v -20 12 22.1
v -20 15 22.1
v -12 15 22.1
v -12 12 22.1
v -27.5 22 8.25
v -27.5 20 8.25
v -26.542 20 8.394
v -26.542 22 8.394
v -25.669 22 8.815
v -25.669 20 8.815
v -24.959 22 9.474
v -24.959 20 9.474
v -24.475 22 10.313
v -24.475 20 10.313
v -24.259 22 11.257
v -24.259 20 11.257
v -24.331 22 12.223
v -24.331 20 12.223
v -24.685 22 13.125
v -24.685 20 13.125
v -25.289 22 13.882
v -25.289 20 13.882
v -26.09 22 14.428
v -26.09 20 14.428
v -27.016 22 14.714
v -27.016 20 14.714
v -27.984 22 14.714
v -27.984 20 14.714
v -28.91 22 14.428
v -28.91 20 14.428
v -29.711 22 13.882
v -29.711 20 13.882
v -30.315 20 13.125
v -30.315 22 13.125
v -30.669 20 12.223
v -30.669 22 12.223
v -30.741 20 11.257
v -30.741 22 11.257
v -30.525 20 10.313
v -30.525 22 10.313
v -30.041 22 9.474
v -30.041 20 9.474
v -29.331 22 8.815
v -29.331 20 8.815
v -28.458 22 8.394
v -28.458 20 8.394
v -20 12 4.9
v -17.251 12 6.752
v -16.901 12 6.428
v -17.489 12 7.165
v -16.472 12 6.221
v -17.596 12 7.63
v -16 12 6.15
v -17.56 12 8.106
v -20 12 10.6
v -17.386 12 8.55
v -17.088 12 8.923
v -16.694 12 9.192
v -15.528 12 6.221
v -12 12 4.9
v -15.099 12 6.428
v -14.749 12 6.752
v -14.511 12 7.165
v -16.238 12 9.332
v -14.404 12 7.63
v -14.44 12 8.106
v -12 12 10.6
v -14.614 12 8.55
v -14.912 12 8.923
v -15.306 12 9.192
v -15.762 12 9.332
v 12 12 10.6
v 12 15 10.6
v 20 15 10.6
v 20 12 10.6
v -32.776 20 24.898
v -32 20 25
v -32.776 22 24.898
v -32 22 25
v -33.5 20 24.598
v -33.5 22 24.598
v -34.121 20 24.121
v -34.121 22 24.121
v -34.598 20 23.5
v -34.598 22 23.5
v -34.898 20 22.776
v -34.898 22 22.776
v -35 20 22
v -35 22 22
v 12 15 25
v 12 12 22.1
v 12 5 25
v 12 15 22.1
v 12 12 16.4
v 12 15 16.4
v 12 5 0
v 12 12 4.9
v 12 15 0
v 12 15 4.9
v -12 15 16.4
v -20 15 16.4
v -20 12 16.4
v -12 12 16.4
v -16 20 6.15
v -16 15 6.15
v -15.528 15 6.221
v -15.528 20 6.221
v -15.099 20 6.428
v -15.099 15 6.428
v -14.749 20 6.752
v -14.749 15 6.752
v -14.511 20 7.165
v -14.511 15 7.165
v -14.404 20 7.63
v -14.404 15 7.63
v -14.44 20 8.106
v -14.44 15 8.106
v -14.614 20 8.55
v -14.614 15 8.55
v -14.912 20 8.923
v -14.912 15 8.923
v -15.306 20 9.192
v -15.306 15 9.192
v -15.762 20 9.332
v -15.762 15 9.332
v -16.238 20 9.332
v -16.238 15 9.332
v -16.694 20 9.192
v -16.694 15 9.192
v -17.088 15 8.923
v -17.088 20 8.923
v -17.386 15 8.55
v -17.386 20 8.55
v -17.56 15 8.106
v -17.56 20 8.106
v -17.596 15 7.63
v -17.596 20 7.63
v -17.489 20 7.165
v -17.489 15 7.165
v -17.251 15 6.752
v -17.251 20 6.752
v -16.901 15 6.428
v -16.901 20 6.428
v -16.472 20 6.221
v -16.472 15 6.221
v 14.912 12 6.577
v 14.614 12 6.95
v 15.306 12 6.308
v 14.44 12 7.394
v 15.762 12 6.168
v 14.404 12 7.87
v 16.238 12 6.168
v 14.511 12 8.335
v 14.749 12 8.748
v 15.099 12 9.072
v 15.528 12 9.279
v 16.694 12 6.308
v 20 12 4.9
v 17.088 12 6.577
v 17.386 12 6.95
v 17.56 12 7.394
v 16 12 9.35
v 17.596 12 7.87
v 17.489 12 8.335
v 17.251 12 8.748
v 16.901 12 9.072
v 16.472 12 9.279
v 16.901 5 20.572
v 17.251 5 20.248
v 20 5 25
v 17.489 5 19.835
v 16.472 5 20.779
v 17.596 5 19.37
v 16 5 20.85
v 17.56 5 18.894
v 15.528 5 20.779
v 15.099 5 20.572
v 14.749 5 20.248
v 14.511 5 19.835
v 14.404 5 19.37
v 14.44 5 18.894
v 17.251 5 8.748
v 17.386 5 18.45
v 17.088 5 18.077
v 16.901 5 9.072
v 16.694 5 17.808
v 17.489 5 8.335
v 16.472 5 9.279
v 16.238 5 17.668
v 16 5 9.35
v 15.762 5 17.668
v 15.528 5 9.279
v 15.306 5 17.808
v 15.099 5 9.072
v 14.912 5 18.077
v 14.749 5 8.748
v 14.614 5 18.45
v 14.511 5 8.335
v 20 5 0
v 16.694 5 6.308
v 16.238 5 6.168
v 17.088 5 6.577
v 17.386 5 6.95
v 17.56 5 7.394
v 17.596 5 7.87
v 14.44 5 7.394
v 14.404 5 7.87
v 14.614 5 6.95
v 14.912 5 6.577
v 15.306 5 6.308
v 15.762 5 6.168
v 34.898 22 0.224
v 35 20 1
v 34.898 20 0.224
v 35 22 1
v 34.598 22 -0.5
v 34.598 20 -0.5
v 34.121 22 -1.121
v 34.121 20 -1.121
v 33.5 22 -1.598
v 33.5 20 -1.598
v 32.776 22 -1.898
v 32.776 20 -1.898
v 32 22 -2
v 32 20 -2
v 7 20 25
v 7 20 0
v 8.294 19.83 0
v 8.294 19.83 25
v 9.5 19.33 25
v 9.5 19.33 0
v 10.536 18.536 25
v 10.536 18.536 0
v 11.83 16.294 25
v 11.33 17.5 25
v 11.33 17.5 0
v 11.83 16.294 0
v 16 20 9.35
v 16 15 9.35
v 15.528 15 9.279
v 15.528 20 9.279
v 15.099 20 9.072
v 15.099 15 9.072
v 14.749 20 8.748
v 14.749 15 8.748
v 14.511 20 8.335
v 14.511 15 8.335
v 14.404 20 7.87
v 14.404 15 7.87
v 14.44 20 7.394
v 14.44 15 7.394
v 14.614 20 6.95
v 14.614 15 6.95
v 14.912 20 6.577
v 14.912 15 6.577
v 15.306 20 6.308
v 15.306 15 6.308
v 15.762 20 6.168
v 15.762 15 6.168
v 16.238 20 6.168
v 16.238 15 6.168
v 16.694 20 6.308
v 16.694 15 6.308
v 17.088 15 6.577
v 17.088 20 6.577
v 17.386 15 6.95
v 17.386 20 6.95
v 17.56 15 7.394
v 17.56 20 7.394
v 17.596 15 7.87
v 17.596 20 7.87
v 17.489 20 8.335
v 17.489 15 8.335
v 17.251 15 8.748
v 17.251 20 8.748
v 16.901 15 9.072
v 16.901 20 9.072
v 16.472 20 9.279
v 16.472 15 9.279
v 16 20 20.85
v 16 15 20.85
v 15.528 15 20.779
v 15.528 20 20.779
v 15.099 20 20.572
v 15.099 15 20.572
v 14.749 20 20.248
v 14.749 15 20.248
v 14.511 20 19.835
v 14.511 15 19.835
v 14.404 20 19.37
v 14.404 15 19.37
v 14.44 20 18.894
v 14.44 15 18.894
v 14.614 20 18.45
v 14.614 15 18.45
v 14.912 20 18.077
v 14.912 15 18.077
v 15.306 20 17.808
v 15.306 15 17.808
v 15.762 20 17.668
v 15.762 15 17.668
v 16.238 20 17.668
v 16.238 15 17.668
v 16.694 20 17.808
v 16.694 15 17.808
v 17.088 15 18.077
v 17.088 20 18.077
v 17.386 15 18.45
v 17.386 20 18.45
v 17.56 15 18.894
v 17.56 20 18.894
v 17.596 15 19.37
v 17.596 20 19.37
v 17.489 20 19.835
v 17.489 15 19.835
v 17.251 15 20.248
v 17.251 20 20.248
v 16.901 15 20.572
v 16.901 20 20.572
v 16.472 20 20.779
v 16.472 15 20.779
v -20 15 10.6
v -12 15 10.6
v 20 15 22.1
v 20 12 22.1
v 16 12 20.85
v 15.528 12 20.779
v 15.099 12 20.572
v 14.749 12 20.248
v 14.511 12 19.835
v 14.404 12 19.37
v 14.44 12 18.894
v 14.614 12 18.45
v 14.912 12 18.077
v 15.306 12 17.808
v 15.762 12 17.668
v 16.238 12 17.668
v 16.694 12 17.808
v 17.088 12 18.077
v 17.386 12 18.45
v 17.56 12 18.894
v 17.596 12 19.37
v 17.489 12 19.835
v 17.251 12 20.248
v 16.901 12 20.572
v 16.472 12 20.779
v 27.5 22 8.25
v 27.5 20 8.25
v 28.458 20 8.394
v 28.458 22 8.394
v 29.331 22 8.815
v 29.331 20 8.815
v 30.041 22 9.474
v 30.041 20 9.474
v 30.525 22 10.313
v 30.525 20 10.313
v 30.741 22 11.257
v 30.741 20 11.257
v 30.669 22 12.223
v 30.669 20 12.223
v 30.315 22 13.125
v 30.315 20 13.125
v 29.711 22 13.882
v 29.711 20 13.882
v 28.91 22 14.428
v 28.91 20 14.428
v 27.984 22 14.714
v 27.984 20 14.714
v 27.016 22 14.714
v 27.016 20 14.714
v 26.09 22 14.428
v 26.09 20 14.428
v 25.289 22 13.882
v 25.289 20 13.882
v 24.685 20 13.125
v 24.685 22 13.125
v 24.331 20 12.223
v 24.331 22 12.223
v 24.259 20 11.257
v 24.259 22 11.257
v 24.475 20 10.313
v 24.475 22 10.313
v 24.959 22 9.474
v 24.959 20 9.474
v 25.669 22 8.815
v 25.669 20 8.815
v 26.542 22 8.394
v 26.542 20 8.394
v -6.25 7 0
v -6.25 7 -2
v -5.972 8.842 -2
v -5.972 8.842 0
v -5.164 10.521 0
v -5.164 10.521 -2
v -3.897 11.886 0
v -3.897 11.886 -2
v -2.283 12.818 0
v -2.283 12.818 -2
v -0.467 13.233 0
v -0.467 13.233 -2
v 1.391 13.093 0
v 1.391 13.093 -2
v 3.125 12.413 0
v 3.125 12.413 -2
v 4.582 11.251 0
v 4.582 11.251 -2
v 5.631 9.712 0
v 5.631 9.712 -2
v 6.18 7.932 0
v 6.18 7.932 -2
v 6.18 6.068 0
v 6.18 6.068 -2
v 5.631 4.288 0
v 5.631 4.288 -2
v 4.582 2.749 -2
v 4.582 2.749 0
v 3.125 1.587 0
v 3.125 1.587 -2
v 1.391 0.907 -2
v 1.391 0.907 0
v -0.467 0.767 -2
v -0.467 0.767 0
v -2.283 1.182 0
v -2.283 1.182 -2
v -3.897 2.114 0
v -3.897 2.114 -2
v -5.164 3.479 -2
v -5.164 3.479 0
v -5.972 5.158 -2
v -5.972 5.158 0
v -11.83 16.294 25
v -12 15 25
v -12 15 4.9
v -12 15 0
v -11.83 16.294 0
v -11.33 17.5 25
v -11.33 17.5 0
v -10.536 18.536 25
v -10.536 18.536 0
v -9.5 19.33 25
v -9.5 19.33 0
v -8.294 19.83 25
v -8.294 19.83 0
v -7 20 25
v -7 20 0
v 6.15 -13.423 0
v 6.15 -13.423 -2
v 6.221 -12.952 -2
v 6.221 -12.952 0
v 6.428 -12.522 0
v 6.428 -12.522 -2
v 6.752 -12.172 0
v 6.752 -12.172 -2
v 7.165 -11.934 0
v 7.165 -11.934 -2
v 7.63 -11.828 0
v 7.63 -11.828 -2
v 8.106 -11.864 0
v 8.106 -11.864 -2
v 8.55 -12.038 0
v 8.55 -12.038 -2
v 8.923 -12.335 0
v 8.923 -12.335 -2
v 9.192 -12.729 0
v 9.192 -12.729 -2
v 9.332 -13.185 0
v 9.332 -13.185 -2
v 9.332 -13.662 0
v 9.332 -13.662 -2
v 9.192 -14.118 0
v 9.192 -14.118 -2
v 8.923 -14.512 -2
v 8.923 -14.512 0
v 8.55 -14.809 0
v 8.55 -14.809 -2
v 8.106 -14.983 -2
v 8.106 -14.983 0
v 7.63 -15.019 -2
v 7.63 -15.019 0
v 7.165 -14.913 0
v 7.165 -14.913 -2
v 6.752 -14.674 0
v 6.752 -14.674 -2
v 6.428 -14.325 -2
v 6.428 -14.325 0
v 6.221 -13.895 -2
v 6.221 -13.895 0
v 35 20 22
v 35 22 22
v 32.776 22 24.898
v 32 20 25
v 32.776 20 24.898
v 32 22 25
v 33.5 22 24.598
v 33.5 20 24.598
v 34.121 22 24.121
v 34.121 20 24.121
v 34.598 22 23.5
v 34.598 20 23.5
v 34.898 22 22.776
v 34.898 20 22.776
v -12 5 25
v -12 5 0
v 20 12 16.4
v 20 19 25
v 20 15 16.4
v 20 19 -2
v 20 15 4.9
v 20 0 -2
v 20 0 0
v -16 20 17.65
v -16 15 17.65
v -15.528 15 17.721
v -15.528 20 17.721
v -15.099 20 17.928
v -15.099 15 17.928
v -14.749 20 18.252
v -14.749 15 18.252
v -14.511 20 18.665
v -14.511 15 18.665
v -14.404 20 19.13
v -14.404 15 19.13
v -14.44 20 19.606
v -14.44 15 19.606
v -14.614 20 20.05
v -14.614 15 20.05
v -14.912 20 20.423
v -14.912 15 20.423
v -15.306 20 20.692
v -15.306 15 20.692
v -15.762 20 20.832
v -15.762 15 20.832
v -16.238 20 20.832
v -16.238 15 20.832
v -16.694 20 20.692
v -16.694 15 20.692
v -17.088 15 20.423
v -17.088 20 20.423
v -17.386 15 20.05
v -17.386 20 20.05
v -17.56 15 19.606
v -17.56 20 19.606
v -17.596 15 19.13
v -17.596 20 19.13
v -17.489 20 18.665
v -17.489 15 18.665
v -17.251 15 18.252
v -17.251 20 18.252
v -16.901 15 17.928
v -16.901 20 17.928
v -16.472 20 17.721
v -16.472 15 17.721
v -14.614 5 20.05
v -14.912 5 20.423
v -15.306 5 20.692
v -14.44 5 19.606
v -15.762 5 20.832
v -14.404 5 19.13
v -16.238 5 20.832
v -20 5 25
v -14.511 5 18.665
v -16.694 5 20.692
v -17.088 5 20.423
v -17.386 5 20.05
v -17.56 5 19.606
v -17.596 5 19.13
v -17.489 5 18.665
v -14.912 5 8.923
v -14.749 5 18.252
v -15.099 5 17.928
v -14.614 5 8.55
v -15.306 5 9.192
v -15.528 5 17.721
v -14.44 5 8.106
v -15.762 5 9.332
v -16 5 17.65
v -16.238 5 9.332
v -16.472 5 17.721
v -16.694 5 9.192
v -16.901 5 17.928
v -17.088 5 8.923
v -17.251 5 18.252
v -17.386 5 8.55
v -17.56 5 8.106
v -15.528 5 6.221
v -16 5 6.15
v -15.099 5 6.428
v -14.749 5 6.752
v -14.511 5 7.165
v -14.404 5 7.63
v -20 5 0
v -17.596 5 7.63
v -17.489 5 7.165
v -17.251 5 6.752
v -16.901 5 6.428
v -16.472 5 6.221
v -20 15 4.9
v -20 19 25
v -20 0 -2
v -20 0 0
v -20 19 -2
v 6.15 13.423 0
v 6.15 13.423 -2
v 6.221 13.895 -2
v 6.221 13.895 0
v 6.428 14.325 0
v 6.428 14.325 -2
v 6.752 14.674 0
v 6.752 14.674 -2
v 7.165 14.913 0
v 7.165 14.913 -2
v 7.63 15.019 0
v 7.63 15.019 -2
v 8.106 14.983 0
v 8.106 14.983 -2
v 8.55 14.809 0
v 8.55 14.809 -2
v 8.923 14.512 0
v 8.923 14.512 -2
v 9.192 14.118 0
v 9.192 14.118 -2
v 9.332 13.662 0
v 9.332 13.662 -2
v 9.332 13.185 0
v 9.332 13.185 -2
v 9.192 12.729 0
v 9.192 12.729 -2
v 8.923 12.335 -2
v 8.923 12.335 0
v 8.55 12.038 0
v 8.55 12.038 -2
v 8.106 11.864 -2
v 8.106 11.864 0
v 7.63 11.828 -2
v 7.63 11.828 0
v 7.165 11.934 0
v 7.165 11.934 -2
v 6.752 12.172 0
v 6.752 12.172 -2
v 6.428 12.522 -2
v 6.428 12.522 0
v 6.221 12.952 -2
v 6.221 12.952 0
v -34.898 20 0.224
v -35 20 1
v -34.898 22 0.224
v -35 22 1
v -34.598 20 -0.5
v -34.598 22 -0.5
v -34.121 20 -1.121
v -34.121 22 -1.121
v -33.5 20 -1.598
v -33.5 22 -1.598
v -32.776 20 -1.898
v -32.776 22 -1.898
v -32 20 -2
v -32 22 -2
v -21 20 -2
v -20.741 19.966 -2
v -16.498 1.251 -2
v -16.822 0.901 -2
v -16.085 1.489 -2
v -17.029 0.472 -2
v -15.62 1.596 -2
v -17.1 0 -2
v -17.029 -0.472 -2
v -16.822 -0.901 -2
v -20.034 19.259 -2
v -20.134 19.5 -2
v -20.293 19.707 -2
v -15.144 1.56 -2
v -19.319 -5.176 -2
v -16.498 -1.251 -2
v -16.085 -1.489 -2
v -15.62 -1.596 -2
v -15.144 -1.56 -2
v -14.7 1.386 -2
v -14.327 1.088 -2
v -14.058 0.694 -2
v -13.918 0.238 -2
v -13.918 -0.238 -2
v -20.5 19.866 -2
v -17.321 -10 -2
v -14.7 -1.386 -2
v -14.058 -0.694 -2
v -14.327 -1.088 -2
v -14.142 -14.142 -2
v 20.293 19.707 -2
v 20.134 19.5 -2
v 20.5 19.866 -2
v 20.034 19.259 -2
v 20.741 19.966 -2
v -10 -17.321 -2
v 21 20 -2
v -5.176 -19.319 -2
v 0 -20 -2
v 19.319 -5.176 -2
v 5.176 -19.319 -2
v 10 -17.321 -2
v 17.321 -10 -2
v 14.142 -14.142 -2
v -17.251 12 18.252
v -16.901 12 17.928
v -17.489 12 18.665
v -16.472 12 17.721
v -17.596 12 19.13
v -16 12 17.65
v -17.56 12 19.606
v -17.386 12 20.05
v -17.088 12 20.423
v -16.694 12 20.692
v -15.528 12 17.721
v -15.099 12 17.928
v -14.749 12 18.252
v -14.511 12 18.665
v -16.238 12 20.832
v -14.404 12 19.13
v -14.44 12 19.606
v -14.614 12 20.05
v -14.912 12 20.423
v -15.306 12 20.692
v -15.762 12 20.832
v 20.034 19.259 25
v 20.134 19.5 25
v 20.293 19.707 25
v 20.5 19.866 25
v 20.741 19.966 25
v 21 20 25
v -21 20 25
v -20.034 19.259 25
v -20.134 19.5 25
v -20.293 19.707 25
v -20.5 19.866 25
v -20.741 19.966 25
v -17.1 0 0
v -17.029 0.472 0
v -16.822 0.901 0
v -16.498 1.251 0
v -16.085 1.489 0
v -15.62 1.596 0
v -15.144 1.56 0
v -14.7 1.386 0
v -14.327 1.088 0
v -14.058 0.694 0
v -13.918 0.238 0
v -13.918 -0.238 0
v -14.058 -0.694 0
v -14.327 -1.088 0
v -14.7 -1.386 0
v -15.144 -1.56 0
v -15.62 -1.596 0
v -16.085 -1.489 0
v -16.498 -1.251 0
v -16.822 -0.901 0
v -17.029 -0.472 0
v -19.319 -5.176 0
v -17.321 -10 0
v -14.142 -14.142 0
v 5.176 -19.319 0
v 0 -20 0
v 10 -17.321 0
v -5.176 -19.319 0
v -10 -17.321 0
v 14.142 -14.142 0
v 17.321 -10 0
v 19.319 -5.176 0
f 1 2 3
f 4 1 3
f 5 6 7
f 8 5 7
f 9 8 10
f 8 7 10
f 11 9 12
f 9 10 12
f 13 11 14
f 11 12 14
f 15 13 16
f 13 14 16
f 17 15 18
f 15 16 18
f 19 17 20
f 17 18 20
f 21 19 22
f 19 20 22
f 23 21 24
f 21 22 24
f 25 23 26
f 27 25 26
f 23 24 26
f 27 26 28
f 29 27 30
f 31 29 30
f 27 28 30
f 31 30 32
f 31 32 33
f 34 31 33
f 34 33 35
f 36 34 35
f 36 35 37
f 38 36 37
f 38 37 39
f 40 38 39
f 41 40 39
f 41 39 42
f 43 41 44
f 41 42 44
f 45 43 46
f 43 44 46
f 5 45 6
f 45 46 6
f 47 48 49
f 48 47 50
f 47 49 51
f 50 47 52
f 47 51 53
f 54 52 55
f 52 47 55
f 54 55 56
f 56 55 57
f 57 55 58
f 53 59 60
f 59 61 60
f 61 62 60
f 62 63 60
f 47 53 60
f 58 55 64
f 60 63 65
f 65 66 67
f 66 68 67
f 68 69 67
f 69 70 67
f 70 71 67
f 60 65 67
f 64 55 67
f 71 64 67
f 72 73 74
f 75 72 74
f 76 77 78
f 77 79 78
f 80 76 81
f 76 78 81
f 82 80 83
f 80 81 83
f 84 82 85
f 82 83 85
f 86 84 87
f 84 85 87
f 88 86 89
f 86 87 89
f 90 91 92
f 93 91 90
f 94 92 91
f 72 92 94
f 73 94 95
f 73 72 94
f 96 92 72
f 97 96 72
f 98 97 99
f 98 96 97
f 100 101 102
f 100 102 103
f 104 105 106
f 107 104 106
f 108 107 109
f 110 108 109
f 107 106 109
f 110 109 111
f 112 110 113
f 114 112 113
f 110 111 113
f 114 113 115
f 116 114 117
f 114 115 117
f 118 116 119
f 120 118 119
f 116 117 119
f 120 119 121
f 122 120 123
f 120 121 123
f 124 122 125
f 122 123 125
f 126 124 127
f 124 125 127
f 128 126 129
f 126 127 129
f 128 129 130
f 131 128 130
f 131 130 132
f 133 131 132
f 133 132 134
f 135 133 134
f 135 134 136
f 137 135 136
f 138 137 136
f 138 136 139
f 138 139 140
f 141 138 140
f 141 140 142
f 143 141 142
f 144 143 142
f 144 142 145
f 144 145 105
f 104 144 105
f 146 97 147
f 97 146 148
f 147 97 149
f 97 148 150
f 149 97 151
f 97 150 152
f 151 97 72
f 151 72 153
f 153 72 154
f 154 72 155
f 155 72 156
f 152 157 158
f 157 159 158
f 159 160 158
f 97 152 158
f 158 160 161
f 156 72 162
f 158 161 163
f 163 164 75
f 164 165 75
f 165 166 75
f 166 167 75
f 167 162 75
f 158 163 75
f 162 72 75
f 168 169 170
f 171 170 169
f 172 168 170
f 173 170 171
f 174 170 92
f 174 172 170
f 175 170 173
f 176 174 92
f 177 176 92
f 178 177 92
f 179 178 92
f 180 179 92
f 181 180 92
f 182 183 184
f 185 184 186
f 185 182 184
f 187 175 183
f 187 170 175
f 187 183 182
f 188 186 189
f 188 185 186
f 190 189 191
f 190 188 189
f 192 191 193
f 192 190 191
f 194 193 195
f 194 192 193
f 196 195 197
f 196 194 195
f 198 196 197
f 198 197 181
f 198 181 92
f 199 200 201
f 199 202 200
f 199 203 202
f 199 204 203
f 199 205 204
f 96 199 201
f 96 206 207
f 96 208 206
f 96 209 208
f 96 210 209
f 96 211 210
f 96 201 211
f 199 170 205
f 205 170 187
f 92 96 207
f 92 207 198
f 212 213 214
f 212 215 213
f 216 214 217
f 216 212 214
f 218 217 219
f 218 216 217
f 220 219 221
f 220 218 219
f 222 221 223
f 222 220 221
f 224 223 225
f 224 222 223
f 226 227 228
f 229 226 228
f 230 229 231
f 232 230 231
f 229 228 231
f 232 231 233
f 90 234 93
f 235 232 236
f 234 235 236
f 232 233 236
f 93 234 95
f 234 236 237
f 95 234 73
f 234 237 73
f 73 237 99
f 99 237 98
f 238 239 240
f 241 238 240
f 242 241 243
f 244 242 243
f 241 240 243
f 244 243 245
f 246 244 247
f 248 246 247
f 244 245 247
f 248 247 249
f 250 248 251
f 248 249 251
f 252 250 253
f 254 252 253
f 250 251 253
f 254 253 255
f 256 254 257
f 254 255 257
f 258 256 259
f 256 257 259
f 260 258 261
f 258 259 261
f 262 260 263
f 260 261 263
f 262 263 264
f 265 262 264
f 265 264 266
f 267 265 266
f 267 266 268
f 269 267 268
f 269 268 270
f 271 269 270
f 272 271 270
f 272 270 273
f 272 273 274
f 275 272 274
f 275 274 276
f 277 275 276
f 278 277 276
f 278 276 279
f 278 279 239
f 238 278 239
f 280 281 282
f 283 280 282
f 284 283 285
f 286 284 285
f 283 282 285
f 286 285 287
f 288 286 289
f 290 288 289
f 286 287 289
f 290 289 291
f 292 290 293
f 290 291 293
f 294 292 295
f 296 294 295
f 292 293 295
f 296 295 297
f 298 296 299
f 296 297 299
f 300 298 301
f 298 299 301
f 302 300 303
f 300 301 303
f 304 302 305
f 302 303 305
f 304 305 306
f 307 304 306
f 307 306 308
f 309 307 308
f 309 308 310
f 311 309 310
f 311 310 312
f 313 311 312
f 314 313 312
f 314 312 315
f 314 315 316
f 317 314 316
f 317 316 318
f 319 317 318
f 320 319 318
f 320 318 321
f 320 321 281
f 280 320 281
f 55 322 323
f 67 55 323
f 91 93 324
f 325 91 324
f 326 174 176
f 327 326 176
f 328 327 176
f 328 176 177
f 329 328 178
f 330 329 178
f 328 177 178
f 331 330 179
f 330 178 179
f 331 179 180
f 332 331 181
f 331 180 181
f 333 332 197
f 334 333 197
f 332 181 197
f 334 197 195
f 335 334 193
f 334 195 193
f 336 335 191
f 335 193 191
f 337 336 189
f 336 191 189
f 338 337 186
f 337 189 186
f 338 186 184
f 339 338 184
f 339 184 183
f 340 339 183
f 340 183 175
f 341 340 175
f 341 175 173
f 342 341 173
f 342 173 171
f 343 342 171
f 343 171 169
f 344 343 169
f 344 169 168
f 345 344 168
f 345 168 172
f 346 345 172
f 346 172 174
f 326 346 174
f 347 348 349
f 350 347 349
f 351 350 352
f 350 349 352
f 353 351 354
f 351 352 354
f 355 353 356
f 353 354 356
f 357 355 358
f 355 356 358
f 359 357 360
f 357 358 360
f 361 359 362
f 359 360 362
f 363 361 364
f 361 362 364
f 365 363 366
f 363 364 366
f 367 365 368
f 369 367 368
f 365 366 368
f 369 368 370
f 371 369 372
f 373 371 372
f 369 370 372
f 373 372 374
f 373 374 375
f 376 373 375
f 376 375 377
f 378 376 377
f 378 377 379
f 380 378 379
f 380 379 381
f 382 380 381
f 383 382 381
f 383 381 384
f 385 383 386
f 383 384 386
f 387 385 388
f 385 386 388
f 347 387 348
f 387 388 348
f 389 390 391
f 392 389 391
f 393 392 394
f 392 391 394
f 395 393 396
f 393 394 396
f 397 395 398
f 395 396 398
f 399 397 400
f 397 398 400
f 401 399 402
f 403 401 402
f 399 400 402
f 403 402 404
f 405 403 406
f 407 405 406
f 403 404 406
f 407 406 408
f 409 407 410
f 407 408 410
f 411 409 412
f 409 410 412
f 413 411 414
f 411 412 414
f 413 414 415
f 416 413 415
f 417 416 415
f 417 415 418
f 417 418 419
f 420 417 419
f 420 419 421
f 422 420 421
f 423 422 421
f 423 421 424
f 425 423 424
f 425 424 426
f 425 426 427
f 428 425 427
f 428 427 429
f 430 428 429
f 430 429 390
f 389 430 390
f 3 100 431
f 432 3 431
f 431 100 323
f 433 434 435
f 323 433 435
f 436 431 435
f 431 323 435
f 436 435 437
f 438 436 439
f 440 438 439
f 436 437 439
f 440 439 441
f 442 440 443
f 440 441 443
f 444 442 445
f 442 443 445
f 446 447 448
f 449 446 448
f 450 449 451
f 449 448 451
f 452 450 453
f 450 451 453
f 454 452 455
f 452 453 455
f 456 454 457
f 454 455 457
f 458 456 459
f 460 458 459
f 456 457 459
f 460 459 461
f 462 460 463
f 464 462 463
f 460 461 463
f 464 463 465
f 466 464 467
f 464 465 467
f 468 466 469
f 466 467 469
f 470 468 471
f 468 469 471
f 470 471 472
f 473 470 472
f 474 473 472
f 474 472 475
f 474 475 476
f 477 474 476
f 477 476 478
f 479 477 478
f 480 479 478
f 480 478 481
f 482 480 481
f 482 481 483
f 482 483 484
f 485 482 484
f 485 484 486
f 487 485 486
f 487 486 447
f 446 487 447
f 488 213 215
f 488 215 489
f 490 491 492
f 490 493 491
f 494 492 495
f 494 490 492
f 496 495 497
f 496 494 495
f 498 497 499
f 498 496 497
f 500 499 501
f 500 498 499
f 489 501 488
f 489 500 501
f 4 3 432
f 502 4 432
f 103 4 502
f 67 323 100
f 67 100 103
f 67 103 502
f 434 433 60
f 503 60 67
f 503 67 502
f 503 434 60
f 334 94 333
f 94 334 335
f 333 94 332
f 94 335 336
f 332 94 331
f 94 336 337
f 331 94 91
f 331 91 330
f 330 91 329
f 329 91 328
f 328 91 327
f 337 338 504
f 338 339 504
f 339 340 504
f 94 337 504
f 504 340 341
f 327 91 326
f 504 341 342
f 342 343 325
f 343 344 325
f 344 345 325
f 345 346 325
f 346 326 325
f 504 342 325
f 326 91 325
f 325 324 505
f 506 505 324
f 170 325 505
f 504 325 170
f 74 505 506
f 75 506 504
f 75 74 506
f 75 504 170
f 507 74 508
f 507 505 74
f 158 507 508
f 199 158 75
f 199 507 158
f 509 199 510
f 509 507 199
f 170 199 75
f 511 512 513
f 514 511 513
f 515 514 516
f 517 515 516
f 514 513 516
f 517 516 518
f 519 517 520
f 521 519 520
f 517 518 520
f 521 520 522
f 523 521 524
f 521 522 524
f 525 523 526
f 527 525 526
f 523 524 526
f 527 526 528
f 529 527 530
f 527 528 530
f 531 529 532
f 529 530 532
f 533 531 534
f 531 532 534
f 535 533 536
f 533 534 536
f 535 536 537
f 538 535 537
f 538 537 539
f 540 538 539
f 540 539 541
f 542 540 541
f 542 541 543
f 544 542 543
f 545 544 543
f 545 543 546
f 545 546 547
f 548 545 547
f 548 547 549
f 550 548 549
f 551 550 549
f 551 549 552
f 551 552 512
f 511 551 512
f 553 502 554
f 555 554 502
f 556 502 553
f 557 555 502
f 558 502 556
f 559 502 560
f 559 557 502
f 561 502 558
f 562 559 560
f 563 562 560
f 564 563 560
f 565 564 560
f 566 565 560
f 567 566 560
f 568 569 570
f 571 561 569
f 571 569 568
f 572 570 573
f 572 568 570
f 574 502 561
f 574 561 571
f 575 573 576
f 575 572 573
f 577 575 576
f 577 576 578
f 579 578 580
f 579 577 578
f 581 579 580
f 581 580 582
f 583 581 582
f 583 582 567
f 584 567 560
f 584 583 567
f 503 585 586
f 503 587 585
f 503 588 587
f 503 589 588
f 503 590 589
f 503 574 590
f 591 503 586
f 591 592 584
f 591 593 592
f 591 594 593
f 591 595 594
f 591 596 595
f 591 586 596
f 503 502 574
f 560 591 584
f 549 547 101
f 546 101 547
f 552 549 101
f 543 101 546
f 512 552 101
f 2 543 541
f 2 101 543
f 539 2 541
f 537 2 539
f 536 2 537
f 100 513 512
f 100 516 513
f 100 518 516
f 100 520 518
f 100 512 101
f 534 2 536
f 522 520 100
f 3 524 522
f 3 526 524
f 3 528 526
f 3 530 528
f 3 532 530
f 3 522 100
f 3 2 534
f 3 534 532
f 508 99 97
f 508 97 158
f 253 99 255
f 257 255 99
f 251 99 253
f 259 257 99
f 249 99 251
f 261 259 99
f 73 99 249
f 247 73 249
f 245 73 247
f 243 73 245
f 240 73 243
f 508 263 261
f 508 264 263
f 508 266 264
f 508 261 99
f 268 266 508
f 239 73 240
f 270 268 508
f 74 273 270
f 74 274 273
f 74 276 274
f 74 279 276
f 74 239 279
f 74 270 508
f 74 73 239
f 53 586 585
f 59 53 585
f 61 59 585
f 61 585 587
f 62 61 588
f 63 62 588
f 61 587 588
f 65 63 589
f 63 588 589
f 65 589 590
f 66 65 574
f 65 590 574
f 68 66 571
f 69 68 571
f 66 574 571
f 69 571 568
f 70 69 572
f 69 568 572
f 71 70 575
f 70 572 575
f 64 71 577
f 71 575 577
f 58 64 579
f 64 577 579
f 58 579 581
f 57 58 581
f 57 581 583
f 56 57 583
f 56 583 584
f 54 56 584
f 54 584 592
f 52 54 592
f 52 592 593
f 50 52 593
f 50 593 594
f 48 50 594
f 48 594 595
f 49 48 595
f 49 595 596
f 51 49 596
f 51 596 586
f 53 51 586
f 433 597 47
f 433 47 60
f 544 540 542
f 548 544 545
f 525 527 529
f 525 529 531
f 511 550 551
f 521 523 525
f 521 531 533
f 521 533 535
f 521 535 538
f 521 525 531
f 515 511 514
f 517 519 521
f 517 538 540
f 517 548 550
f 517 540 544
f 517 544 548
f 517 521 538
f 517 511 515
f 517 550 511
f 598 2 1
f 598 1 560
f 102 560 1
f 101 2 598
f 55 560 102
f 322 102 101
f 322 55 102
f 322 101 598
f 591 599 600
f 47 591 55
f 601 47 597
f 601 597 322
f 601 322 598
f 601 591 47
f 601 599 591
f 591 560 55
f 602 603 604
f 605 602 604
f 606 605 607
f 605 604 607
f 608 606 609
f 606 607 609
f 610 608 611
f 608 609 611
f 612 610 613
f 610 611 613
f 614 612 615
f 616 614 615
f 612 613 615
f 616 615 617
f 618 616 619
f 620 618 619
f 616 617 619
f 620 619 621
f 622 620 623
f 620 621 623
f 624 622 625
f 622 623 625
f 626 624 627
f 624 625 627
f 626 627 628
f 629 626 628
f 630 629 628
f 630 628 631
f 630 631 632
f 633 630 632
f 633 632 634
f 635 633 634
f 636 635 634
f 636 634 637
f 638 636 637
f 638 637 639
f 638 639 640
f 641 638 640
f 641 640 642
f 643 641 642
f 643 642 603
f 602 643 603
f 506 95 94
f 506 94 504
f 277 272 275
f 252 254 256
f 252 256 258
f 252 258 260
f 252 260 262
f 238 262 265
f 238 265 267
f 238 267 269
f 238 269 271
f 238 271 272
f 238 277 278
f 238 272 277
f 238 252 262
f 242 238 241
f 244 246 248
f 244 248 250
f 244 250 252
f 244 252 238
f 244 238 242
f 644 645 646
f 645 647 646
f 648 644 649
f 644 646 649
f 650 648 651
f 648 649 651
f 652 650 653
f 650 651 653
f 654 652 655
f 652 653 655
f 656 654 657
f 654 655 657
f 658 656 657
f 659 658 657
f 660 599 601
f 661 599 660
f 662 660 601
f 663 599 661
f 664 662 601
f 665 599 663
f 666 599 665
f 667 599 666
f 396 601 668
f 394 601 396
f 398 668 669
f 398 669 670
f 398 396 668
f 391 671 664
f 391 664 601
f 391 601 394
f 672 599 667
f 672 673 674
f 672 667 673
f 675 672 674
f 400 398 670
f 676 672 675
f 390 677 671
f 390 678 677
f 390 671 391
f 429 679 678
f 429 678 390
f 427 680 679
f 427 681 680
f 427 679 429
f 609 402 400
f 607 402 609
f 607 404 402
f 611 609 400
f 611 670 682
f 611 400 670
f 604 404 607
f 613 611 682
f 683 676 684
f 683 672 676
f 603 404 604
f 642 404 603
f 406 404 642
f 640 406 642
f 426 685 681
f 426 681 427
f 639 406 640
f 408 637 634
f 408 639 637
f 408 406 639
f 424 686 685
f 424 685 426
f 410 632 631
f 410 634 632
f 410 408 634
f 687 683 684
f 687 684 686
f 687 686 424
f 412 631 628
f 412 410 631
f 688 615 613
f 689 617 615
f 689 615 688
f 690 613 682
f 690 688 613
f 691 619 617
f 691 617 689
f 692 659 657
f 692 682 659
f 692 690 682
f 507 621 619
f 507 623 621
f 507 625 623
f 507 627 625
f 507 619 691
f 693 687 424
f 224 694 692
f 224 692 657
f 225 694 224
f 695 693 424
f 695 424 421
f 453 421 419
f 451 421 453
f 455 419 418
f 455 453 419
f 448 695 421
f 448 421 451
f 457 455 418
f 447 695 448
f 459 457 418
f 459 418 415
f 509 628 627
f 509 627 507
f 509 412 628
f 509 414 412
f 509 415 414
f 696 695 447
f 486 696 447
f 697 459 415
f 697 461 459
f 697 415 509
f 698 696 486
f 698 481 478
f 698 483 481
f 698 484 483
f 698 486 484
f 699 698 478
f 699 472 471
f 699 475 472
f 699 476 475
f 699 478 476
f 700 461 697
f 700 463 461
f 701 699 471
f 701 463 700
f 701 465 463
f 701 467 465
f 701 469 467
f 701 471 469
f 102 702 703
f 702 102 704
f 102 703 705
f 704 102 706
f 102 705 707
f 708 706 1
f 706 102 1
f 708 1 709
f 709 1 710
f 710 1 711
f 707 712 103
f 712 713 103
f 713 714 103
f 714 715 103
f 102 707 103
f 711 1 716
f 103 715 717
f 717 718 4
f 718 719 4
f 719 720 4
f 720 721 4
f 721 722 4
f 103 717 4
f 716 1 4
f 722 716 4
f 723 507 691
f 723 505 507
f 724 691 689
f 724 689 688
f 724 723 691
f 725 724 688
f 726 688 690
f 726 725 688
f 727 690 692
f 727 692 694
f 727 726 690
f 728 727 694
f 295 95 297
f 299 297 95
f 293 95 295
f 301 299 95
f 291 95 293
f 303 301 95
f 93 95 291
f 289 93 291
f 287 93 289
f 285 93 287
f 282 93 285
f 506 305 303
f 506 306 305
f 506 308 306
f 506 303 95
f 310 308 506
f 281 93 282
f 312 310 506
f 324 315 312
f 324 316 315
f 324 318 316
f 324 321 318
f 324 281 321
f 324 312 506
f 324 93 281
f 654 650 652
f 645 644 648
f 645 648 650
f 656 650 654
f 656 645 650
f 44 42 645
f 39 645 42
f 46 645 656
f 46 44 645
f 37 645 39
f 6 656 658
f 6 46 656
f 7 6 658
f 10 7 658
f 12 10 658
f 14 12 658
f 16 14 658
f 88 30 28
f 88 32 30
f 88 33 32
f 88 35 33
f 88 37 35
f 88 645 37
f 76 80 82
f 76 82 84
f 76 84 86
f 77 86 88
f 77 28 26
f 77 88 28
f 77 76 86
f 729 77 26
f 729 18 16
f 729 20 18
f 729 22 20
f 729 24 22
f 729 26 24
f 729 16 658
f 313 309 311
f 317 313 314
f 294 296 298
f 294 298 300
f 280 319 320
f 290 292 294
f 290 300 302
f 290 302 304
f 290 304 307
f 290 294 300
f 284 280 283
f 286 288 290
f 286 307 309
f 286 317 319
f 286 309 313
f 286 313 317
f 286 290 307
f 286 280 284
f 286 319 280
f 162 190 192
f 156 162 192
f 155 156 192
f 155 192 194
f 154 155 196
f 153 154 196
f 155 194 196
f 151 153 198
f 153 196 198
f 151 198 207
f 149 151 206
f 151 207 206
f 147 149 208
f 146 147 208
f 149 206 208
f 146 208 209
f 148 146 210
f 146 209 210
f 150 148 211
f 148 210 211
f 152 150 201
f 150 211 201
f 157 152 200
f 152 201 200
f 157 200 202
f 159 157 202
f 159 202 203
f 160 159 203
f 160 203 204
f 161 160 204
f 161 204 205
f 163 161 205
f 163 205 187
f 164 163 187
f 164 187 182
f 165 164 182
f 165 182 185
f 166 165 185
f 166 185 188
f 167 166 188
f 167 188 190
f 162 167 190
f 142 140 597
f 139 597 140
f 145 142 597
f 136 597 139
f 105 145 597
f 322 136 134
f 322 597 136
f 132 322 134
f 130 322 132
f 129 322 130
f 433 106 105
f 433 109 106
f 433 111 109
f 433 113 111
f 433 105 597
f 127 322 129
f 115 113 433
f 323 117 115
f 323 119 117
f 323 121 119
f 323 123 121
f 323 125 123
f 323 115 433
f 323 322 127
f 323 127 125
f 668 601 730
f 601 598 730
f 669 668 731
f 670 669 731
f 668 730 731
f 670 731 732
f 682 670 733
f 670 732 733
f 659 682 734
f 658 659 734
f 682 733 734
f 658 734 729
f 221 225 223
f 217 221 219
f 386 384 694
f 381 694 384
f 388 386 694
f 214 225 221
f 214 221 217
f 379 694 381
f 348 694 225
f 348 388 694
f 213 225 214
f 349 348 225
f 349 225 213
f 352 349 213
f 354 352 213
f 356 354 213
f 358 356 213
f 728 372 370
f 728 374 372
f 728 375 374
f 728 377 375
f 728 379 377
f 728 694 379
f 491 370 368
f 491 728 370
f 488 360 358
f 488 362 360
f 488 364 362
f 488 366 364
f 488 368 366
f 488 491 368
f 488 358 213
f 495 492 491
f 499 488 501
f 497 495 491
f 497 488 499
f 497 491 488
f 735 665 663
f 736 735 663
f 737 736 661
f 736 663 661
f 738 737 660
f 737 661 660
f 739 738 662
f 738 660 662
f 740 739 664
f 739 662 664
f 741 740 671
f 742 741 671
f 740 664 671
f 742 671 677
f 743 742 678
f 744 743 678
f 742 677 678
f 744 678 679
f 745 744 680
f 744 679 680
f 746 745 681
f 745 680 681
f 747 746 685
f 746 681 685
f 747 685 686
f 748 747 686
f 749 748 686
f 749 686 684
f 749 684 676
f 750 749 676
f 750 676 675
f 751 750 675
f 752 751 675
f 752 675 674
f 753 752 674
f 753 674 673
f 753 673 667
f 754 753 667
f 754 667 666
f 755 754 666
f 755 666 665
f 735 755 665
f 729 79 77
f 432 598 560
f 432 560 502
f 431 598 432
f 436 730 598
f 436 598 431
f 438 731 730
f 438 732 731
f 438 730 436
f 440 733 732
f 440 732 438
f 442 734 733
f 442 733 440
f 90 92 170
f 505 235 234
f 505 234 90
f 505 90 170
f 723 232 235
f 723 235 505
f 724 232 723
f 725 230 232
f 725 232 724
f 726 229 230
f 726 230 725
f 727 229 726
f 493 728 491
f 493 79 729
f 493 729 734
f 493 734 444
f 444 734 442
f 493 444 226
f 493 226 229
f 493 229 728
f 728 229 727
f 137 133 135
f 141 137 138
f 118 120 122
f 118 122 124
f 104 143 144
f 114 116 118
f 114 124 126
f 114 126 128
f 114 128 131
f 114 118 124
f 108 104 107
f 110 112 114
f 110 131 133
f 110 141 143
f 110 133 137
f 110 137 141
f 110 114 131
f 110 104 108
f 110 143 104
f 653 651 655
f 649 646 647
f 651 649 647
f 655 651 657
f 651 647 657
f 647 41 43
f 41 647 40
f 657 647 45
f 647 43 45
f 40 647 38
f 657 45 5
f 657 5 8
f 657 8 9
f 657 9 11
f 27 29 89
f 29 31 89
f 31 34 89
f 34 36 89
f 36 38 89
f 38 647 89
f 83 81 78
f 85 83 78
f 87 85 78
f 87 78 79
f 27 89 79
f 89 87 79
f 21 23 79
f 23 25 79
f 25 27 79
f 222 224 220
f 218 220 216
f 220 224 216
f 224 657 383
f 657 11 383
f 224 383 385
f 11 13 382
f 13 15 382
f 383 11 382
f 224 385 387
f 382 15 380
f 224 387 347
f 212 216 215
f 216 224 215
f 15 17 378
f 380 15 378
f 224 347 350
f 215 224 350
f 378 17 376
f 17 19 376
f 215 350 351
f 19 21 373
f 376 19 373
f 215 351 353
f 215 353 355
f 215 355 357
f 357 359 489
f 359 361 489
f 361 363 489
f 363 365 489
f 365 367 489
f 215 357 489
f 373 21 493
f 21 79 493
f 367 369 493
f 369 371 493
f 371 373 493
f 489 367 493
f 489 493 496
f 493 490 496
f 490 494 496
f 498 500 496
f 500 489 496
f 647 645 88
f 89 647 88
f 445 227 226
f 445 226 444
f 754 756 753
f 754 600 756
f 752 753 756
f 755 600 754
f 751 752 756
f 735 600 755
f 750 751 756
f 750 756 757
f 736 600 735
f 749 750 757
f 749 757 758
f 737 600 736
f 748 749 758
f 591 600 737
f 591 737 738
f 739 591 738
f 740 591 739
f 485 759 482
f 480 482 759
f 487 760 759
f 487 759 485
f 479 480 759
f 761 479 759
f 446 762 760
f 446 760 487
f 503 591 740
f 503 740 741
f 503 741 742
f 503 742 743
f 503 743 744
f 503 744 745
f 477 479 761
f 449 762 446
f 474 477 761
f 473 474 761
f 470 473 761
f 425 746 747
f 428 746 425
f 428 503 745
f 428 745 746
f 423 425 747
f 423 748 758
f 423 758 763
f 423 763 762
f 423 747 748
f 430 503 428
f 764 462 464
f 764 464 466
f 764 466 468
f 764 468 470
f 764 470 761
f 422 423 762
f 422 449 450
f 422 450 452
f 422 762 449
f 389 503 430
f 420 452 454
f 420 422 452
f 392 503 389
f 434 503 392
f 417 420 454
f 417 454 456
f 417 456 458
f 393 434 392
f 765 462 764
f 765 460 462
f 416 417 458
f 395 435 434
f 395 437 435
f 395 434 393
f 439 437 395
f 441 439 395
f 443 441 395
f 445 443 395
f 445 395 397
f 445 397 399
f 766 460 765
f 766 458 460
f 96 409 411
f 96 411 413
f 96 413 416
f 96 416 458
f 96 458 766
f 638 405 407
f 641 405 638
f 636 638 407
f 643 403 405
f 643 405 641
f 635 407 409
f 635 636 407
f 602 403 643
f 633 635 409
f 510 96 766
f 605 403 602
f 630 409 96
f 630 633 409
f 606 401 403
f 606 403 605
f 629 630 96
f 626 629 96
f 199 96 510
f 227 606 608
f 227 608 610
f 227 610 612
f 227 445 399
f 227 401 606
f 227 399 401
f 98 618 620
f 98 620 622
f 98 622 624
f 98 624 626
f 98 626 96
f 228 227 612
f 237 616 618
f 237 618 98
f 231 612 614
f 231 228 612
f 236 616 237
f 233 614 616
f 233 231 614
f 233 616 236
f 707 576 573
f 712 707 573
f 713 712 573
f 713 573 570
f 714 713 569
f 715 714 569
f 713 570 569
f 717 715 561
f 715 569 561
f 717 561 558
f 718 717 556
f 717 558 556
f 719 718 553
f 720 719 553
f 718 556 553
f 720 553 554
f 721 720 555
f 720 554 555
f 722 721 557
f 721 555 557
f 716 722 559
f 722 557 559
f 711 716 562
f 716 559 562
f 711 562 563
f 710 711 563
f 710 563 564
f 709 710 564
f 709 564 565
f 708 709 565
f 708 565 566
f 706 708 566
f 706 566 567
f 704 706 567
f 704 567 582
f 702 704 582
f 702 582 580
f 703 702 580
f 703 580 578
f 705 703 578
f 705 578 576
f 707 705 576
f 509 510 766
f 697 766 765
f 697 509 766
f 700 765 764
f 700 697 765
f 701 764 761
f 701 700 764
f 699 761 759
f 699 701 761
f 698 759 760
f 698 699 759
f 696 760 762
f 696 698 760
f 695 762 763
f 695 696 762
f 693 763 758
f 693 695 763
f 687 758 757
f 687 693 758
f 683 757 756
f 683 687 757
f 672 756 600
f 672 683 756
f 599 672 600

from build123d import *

# Parameters (mm, degrees)
SKETCH1_W           = 40
SKETCH1_H           = 40
SKETCH1_R           = 1.6
SKETCH1_R_2         = 6.25
BOSS_EXTRUDE1_DEPTH = 2
SKETCH2_W           = 40
SKETCH2_H           = 25
BOSS_EXTRUDE2_DEPTH = 2
SKETCH3_W           = 8
SKETCH3_H           = 23
BOSS_EXTRUDE3_DEPTH = 15
CUT_EXTRUDE1_DEPTH  = 15
SKETCH5_R           = 1.6
CUT_EXTRUDE2_DEPTH  = 15
BOSS_EXTRUDE4_START = 2
SKETCH8_R           = 1.6
SKETCH8_R_2         = 6.25
BOSS_EXTRUDE4_DEPTH = 2
CUT_EXTRUDE6_START  = -2
SKETCH9_R           = 6.25
SKETCH9_R_2         = 1.6
CUT_EXTRUDE6_DEPTH  = 2
CUT_EXTRUDE5_START  = -10
SKETCH7_W           = 8
SKETCH7_H           = 5.7
CUT_EXTRUDE5_DEPTH  = 3
SKETCH10_W          = 15
SKETCH10_H          = 27
SKETCH10_R          = 3.25
BOSS_EXTRUDE5_DEPTH = 2
FILLET2_START       = -1
FILLET2_DEPTH       = 26
FILLET3_R           = 1
FILLET4_R           = 3


with BuildPart() as part:
    # Sketch1 → Boss-Extrude1 (new body)
    with BuildSketch(Plane.XY):
        Rectangle(SKETCH1_W, SKETCH1_H)
        with Locations((-15.5, 0)):
            Circle(SKETCH1_R, mode=Mode.SUBTRACT)
        with Locations((7.75, 13.423393759)):
            Circle(SKETCH1_R, mode=Mode.SUBTRACT)
        with Locations((7.75, -13.423393759)):
            Circle(SKETCH1_R, mode=Mode.SUBTRACT)
        with Locations((0, 7)):
            Circle(SKETCH1_R_2, mode=Mode.SUBTRACT)
    extrude(amount=BOSS_EXTRUDE1_DEPTH)

    # Sketch2 → Boss-Extrude2 (add)
    with BuildSketch(Plane(origin=(0, 20, 0), x_dir=(1, 0, 0), z_dir=(0, 1, 0))):
        with Locations((0, -12.5)):
            Rectangle(SKETCH2_W, SKETCH2_H)
    extrude(amount=BOSS_EXTRUDE2_DEPTH)

    # Sketch3 → Boss-Extrude3 (add)
    with BuildSketch(Plane.XZ.offset(-20)):
        with Locations((-16, 13.5)):
            Rectangle(SKETCH3_W, SKETCH3_H)
        with Locations((16, 13.5)):
            Rectangle(SKETCH3_W, SKETCH3_H)
    extrude(amount=BOSS_EXTRUDE3_DEPTH)

    # Sketch4 → Cut-Extrude1 (cut)
    with BuildSketch(Plane.XY.offset(2)):
        with BuildLine():
            ThreePointArc((3.6e-08, -20), (-14.142135611, -14.142135636), (-20, 0))
            Line((-20, 0), (-20, -20))
            Line((-20, -20), (3.6e-08, -20))
        make_face()
        with BuildLine():
            ThreePointArc((20, 0), (14.142135636, -14.142135611), (3.6e-08, -20))
            Line((3.6e-08, -20), (20, -20))
            Line((20, -20), (20, 0))
        make_face()
    extrude(amount=-CUT_EXTRUDE1_DEPTH, mode=Mode.SUBTRACT)

    # Sketch5 → Cut-Extrude2 (cut)
    with BuildSketch(Plane.XZ.offset(-5)):
        with Locations(Location((-16, 7.75, 0), (0, 0, 270))):
            Circle(SKETCH5_R)
        with Locations(Location((-16, 19.25, 0), (0, 0, 270))):
            Circle(SKETCH5_R)
        with Locations(Location((16, 7.75, 0), (0, 0, 90))):
            Circle(SKETCH5_R)
        with Locations(Location((16, 19.25, 0), (0, 0, 90))):
            Circle(SKETCH5_R)
    extrude(amount=-CUT_EXTRUDE2_DEPTH, mode=Mode.SUBTRACT)

    # Sketch8 → Boss-Extrude4 (add)
    with BuildSketch(Plane(origin=(0, 0, 0), x_dir=(-1, 0, 0), z_dir=(0, 0, -1)).offset(BOSS_EXTRUDE4_START)):
        with BuildLine():
            Line((-20, 22), (-20, 0))
            ThreePointArc((-20, 0), (0, -20), (20, 0))
            Line((20, 0), (20, 22))
            Line((20, 22), (-20, 22))
        make_face()
        with Locations((-7.75, 13.423393759)):
            Circle(SKETCH8_R, mode=Mode.SUBTRACT)
        with Locations((0, 7)):
            Circle(SKETCH8_R_2, mode=Mode.SUBTRACT)
        with Locations((15.5, 0)):
            Circle(SKETCH8_R, mode=Mode.SUBTRACT)
        with Locations((-7.75, -13.423393759)):
            Circle(SKETCH8_R, mode=Mode.SUBTRACT)
    extrude(amount=-BOSS_EXTRUDE4_DEPTH)

    # Sketch9 → Cut-Extrude6 (cut)
    with BuildSketch(Plane.XY.offset(2).offset(CUT_EXTRUDE6_START)):
        with BuildLine():
            Line((20, 0), (20, 5))
            Line((20, 5), (12, 5))
            Line((12, 5), (12, 20))
            Line((12, 20), (-12, 20))
            Line((-12, 20), (-12, 5))
            Line((-12, 5), (-20, 5))
            Line((-20, 5), (-20, 0))
            ThreePointArc((-20, 0), (0, -20), (20, 0))
        make_face()
        with Locations(Location((0, 7, 0), (0, 0, 180))):
            Circle(SKETCH9_R, mode=Mode.SUBTRACT)
        with Locations(Location((7.75, 13.423393759, 0), (0, 0, 180))):
            Circle(SKETCH9_R_2, mode=Mode.SUBTRACT)
        with Locations(Location((-15.5, 0, 0), (0, 0, 180))):
            Circle(SKETCH9_R_2, mode=Mode.SUBTRACT)
        with Locations(Location((7.75, -13.423393759, 0), (0, 0, 180))):
            Circle(SKETCH9_R_2, mode=Mode.SUBTRACT)
    extrude(amount=CUT_EXTRUDE6_DEPTH, mode=Mode.SUBTRACT)

    # Sketch7 → Cut-Extrude5 (cut)
    with BuildSketch(Plane.XZ.offset(-5).offset(CUT_EXTRUDE5_START)):
        with Locations((-16, 19.25)):
            Rectangle(SKETCH7_W, SKETCH7_H)
        with Locations((16, 19.25)):
            Rectangle(SKETCH7_W, SKETCH7_H)
        with Locations((16, 7.75)):
            Rectangle(SKETCH7_W, SKETCH7_H)
        with Locations((-16, 7.75)):
            Rectangle(SKETCH7_W, SKETCH7_H)
    extrude(amount=CUT_EXTRUDE5_DEPTH, mode=Mode.SUBTRACT)

    # Sketch10 → Boss-Extrude5 (add)
    # profile 1 of 2: a face of its own
    with BuildSketch(Plane.XZ.offset(-20)):
        with Locations((-27.5, 11.5)):
            Rectangle(SKETCH10_W, SKETCH10_H)
        with Locations(Location((-27.5, 11.5, 0), (0, 0, 270))):
            Circle(SKETCH10_R, mode=Mode.SUBTRACT)
    # profile 2 of 2: a face of its own
    with BuildSketch(Plane.XZ.offset(-20)):
        with Locations((27.5, 11.5)):
            Rectangle(SKETCH10_W, SKETCH10_H)
        with Locations(Location((27.5, 11.5, 0), (0, 0, 270))):
            Circle(SKETCH10_R, mode=Mode.SUBTRACT)
    extrude(amount=-BOSS_EXTRUDE5_DEPTH)

    # Fillet2: read off the stored shape, not the designer's step
    # Fillet2 outline → Fillet2 (add)
    with BuildSketch(Plane.XY.offset(FILLET2_START)):
        with BuildLine():
            ThreePointArc((-12, 15), (-10.535533906, 18.535533906), (-7, 20))
            Line((-7, 20), (-12, 20))
            Line((-12, 20), (-12, 15))
        make_face()
        with BuildLine():
            ThreePointArc((7, 20), (10.535533906, 18.535533906), (12, 15))
            Line((12, 15), (12, 20))
            Line((12, 20), (7, 20))
        make_face()
    extrude(amount=FILLET2_DEPTH)

    # Fillet3
    fillet3_edges = [part.edges().sort_by_distance(p)[0] for p in [
        (-20, 20, 11.5),
        (20, 20, 11.5),
    ]]
    fillet(fillet3_edges, radius=FILLET3_R)

    # Fillet4
    fillet4_edges = [part.edges().sort_by_distance(p)[0] for p in [
        (-35, 21, -2),
        (-35, 21, 25),
        (35, 21, 25),
        (35, 21, -2),
    ]]
    fillet(fillet4_edges, radius=FILLET4_R)


solid = part.part
